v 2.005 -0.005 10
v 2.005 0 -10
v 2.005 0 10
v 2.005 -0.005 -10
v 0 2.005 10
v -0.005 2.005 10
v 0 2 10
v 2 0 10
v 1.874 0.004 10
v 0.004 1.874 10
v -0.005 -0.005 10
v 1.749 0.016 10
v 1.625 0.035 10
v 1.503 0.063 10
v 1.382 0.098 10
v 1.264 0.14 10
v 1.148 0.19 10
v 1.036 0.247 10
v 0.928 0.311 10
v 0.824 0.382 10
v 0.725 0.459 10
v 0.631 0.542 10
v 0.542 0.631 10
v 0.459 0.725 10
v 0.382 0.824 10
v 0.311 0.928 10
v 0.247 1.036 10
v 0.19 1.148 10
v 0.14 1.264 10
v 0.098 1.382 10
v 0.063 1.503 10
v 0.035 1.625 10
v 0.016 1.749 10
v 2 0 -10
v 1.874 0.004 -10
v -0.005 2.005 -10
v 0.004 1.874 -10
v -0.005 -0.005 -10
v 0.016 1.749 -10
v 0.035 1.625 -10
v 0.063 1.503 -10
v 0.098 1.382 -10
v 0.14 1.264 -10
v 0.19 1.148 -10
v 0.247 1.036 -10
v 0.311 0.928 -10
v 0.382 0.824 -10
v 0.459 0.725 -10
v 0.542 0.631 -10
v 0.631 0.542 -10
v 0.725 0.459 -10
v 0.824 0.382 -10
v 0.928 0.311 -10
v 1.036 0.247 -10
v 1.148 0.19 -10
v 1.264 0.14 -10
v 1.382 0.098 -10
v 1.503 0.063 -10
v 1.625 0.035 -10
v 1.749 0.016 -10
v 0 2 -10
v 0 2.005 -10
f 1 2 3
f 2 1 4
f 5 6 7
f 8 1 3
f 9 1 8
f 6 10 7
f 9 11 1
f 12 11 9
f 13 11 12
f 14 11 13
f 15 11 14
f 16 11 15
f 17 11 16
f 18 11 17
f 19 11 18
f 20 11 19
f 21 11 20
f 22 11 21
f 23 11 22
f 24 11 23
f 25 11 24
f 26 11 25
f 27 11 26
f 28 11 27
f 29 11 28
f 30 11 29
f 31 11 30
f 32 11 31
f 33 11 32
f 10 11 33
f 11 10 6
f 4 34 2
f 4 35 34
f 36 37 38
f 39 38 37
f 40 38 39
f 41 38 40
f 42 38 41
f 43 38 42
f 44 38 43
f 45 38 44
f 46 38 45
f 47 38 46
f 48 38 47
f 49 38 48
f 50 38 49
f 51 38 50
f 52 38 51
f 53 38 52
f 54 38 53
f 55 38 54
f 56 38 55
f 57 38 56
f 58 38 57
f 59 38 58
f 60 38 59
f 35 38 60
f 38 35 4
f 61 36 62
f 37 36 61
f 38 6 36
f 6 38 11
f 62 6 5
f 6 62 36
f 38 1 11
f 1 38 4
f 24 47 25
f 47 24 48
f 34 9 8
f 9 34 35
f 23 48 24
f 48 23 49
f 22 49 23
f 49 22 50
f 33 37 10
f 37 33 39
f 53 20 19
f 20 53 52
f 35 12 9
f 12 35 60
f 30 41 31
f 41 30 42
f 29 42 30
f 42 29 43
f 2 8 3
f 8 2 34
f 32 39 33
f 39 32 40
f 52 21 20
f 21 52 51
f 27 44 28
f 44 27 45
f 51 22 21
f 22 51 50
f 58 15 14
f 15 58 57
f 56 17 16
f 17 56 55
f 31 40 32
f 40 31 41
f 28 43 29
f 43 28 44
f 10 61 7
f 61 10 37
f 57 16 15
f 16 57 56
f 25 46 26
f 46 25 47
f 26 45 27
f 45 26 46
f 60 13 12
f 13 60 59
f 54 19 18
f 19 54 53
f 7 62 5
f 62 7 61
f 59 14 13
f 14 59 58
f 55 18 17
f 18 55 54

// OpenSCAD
fillet(2, 20);

module fillet(r, h, $fn=100)
{
    translate([r / 2, r / 2, 0])
    {
        difference()
        {
            cube([r + 0.01, r + 0.01, h], center = true);

            translate([r/2, r/2, 0])
                cylinder(r = r, h = h + 1, center = true);

        }
    }
}
